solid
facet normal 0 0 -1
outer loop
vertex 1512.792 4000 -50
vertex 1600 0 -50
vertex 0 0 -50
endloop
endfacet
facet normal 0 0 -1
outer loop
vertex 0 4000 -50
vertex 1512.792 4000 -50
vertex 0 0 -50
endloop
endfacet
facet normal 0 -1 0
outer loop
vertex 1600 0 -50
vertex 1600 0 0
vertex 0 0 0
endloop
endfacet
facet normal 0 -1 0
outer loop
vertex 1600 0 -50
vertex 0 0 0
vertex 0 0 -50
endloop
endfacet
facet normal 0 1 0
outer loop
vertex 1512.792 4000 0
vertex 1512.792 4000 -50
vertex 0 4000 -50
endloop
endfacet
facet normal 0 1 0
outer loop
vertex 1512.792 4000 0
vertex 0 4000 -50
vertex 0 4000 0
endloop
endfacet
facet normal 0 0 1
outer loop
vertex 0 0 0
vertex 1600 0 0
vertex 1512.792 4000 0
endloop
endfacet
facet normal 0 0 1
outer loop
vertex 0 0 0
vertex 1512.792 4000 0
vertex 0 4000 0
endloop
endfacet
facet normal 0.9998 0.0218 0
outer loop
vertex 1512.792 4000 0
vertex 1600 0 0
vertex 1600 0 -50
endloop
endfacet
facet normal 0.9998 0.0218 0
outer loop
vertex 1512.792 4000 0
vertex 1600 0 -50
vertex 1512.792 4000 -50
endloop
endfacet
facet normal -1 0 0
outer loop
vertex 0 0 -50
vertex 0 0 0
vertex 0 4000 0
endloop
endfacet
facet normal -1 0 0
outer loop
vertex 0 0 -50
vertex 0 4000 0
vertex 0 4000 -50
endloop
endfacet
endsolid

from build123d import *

# Parameters (mm, degrees)
THICKEN1_T2 = 50


with BuildPart() as body_1:
    # Sketch4 → Surface-Plane1: a flat surface bounded by the sketch
    with BuildSketch(Plane.XY, mode=Mode.PRIVATE) as surface_plane1_1_region:
        Polygon((0, 0), (0, 4000), (1512.79175792, 4000), (1600, 0), align=None)
    surface_plane1_1 = surface_plane1_1_region.sketch.faces()[0]
    add(Solid.thicken(surface_plane1_1, -THICKEN1_T2))


solid = body_1.part
